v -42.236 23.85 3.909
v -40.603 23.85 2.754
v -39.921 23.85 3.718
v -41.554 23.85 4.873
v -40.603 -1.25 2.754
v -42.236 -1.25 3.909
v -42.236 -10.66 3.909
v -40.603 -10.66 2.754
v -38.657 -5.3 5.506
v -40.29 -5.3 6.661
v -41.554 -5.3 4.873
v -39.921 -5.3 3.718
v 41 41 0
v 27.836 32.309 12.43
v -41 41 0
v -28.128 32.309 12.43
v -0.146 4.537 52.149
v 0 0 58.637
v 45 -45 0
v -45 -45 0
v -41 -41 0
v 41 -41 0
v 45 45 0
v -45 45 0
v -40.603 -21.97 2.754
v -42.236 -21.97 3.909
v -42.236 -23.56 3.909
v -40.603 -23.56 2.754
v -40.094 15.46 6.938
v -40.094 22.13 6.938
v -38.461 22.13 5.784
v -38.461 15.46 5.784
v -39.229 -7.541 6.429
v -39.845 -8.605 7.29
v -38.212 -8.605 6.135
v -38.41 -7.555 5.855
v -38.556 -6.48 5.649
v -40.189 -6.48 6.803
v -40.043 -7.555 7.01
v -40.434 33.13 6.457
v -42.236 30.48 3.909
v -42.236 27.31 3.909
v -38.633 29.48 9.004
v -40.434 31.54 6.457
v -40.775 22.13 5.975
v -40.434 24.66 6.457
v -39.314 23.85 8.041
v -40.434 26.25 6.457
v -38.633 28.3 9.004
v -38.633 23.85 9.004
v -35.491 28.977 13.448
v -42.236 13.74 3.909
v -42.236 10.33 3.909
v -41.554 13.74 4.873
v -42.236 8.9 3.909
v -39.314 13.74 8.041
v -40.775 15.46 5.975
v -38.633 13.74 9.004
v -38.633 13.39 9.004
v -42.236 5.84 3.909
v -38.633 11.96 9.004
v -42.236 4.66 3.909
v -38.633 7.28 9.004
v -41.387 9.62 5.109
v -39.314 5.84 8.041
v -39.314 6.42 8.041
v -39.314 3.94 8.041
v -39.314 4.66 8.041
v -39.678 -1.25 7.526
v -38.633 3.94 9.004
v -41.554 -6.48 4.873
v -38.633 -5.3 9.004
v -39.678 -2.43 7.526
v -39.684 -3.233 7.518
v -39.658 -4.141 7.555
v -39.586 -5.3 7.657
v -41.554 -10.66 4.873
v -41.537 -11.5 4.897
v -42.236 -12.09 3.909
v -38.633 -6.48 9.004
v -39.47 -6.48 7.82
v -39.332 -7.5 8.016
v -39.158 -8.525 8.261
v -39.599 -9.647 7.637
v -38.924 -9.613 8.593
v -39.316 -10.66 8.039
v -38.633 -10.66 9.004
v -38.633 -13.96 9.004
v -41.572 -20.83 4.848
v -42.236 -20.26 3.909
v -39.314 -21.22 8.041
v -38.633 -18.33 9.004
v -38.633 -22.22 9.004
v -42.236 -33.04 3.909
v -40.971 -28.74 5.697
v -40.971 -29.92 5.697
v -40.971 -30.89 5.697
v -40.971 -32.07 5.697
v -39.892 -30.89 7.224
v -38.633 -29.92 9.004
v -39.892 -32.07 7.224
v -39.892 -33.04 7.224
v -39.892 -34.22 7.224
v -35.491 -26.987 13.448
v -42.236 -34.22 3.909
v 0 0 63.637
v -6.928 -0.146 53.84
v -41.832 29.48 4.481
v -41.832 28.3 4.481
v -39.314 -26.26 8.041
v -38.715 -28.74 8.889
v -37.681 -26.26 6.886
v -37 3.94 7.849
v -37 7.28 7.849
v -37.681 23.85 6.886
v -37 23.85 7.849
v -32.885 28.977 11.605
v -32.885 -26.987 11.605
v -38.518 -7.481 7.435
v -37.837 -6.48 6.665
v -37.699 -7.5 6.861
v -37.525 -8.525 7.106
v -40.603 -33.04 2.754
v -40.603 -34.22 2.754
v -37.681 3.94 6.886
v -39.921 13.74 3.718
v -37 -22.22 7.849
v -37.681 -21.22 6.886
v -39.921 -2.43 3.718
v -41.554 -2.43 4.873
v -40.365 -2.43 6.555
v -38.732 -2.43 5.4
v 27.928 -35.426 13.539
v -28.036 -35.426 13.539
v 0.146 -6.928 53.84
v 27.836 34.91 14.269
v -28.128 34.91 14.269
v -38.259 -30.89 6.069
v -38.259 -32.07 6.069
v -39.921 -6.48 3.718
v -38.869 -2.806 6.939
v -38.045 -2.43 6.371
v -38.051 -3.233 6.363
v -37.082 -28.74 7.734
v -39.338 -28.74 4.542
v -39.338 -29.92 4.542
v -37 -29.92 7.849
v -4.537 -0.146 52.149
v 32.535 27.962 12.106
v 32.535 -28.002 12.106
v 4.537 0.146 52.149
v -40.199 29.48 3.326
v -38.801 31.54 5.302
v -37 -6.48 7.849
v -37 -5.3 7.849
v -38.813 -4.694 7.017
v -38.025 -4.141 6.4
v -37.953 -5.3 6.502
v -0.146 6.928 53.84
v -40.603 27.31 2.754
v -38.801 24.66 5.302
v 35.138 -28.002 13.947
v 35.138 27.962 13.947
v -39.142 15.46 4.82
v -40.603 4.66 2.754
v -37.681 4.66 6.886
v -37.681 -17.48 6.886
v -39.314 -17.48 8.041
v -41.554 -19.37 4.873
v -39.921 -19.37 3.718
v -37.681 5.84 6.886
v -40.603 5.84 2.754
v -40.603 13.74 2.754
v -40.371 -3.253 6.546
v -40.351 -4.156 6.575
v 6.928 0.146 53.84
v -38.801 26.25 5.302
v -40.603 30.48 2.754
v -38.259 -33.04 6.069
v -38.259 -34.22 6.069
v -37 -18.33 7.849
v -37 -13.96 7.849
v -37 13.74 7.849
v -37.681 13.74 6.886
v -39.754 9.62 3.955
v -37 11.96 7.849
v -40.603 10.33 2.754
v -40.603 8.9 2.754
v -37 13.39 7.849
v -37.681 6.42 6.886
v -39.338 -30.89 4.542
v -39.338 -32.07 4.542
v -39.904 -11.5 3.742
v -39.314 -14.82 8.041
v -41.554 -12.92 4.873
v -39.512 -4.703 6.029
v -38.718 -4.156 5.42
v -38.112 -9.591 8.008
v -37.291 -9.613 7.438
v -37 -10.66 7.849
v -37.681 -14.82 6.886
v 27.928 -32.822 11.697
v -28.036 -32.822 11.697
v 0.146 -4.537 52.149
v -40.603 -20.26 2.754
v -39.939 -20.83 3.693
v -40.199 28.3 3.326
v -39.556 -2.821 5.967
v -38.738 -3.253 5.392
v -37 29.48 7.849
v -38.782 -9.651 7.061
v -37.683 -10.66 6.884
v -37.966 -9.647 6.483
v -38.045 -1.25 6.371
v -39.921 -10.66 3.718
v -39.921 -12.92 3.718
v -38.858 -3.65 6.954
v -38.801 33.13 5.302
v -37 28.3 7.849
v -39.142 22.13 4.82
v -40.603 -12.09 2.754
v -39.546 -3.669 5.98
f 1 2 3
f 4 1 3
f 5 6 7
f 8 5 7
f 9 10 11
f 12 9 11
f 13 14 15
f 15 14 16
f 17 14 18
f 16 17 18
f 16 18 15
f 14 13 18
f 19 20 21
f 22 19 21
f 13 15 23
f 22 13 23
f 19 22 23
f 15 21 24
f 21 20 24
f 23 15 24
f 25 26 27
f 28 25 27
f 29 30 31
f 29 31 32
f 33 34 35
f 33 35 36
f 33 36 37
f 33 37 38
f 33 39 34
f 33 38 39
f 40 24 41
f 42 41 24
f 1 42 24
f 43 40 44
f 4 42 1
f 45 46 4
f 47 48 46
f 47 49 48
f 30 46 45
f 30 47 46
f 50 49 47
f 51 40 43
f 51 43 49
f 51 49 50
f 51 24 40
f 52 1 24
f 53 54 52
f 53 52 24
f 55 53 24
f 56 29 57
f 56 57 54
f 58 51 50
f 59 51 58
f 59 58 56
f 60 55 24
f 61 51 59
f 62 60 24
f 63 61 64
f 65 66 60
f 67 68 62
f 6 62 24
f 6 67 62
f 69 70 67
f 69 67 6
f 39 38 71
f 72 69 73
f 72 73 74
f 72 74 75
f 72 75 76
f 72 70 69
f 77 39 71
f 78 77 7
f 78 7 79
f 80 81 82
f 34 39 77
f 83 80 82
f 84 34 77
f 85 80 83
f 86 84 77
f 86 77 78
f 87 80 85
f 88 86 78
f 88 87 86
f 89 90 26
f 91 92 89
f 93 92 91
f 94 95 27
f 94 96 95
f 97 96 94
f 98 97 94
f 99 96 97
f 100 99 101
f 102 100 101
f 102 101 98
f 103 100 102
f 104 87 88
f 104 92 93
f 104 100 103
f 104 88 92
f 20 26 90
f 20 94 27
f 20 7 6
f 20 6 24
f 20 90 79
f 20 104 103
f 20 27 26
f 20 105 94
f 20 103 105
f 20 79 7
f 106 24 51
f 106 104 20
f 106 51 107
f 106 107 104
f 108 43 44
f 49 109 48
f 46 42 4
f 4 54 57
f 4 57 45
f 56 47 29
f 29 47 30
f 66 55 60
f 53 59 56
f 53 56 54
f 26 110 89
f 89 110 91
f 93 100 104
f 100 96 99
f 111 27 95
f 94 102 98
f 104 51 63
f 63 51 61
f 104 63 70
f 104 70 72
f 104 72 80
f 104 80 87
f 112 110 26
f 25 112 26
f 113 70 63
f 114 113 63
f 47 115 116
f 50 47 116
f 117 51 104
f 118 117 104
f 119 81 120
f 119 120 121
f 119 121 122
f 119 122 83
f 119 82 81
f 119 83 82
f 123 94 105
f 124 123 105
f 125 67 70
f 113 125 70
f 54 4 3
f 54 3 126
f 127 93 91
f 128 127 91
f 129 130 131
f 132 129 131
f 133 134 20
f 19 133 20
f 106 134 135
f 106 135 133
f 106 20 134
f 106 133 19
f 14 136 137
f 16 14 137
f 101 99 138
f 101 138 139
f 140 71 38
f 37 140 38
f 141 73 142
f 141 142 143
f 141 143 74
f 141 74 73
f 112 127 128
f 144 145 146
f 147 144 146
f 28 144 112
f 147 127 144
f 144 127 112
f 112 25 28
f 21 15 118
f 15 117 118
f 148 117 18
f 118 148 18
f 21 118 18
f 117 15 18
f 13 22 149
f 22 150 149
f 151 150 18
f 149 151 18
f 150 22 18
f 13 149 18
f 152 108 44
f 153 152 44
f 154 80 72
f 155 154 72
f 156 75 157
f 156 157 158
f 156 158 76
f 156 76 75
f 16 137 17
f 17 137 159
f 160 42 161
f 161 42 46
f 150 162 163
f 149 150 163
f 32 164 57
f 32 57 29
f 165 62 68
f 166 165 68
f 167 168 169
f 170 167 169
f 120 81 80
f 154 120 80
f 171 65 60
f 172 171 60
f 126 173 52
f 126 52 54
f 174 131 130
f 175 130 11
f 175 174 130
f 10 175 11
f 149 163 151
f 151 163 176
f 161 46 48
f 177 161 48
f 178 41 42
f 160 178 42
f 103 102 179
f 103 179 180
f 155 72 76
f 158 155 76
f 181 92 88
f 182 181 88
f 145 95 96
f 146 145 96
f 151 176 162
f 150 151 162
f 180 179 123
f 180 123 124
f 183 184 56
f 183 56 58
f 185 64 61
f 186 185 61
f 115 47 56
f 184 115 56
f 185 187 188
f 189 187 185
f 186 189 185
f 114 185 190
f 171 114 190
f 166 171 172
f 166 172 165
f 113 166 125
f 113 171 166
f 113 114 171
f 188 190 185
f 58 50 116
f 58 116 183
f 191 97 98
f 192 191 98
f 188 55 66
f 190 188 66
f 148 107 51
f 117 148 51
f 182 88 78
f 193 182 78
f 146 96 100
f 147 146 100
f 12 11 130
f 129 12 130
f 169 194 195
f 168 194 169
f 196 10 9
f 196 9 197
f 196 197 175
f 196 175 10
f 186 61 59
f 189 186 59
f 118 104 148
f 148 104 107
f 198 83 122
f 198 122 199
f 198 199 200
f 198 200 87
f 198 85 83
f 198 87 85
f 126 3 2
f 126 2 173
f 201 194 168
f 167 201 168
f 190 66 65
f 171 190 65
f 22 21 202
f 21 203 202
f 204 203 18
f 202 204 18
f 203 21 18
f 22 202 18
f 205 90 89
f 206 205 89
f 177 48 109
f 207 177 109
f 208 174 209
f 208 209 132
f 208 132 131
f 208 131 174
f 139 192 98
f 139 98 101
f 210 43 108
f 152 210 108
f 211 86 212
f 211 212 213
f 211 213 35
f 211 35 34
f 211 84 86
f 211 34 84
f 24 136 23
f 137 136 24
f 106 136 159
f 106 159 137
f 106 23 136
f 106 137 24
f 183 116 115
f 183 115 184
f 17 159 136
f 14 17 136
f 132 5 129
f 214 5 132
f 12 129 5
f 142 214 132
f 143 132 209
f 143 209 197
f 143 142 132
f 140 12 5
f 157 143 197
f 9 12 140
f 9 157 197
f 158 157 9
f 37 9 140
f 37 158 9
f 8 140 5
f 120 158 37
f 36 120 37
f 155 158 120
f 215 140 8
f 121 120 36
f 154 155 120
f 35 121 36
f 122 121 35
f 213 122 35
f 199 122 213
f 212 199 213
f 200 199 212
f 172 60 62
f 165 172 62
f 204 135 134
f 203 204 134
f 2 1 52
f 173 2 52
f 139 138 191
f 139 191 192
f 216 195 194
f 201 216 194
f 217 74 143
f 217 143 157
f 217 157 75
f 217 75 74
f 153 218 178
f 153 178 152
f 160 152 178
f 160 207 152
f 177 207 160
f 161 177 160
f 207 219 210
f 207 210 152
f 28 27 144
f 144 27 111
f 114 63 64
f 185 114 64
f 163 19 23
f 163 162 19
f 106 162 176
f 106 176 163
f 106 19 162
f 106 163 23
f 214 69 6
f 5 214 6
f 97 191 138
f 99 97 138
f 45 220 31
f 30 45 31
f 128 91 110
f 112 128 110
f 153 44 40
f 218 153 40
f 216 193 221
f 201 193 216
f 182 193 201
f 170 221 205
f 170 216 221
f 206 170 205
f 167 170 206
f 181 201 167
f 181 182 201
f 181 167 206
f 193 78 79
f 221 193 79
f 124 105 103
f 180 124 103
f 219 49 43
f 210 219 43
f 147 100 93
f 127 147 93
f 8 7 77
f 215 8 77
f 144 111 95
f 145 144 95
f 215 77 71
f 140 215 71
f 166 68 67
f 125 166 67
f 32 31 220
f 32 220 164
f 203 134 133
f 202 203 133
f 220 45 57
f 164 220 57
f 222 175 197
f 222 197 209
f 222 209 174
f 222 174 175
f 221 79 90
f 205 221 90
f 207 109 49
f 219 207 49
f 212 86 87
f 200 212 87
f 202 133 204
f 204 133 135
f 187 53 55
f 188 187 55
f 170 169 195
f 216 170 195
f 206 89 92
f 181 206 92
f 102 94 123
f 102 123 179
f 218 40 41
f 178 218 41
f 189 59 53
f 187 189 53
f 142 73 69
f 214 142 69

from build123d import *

# Parameters (mm, degrees)
F2_W      = 90
F2_H      = 90
F6_W      = 82
F6_H      = 82
F12_DEPTH = 5
F13_DEPTH = 10.1
F14_DEPTH = 10
F15_DEPTH = 10
F16_W     = 1.180001
F16_H     = 1.870001
F16_W_2   = 1.18
F16_H_2   = 4.060001
F16_W_3   = 10.110001
F16_H_3   = 1.18
F16_W_4   = 6.670001
F17_DEPTH = 2


# Not quite as in the source:
# - the dataset's text gives a spline's control points without its knots; the knots are read off the source's solid


with BuildPart() as f3:
    # F2 (on Top) → F3 section 0
    with BuildSketch(Plane.XY, mode=Mode.PRIVATE) as f3_s0:
        Rectangle(F2_W, F2_H)
    loft([f3_s0.sketch, Vertex(0, 0, 63.6368)])

    # F6 (on face) → F7 section 0
    with BuildSketch(Plane.XY, mode=Mode.PRIVATE) as f7_s0:
        Rectangle(F6_W, F6_H)
    loft([f7_s0.sketch, Vertex(0, 0, 58.6368)], mode=Mode.SUBTRACT)

    # F8 (on face) → F12 (cut, symmetric)
    with BuildSketch(Plane(origin=(29.9991167733, 0, 21.2135156827), x_dir=(0, 1, 0), z_dir=(0.8164845616, 0, 0.5773672666))):
        Polygon((0.1463476627, 39.9593571873), (-28.0024763197, -8.9000007138), (27.9615262598, -8.9000007138), align=None)
    extrude(amount=F12_DEPTH, both=True, mode=Mode.SUBTRACT)

    # F9 (on face) → F13 (cut)
    with BuildSketch(Plane(origin=(0, 29.9991167733, 21.2135156827), x_dir=(-1, 0, 0), z_dir=(0, 0.8164845616, 0.5773672666))):
        Polygon((0.1463476627, 39.9593571873), (-27.835653627, -8.5054690465), (28.1283489525, -8.5054690465), align=None)
    extrude(amount=-F13_DEPTH, mode=Mode.SUBTRACT)

    # F10 (on face) → F14 (cut)
    with BuildSketch(Plane(origin=(-29.9991167733, 0, 21.2135156827), x_dir=(0, -1, 0), z_dir=(-0.8164845616, 0, 0.5773672666))):
        Polygon((0.1463476627, 39.9593571873), (-28.9770383388, -9.5114903525), (26.9869642407, -9.5114903525), align=None)
    extrude(amount=-F14_DEPTH, mode=Mode.SUBTRACT)

    # F11 (on face) → F15 (cut)
    with BuildSketch(Plane(origin=(0, -29.9991167733, 21.2135156827), x_dir=(1, 0, 0), z_dir=(0, -0.8164845616, 0.5773672666))):
        Polygon((0.1463476627, 39.9593571873), (-28.0361250043, -9.3999961391), (27.9278775752, -9.3999961391), align=None)
    extrude(amount=-F15_DEPTH, mode=Mode.SUBTRACT)

    # F16 (on face) → F17 (cut)
    with BuildSketch(Plane(origin=(-29.9991167733, 0, 21.2135156827), x_dir=(0, -1, 0), z_dir=(-0.8164845616, 0, 0.5773672666))):
        Polygon((21.9697801374, -21.1938021154), (23.5597841374, -21.1938021154), (28.7397811374, -15.0950853876), (28.7397811374, -19.0038021154), (29.9197811374, -19.0038021154), (29.9197811374, -14.9538011154), (28.8597821374, -14.9538011154), (28.7397811374, -14.9538011154), (22.2197811374, -14.9538011154), (21.2197821374, -16.1338011154), (26.2597841374, -16.1338011154), align=None)
        with Locations((31.4797826374, -18.0688016154)):
            Rectangle(F16_W, F16_H)
        with Locations((33.6297791374, -19.1638016154)):
            Rectangle(F16_W_2, F16_H_2)
        Polygon((12.0897811374, -21.1938021154), (20.2597801374, -21.1938021154), (20.8297821374, -20.0438011154), (18.3297821374, -14.9538011154), (13.9597791374, -14.9538011154), (11.4997811374, -19.9838021154), align=None)
        Polygon((19.3697831374, -20.0138021154), (12.9197831374, -20.0138021154), (14.8197791374, -16.1338011154), (17.4797821374, -16.1338011154), align=None, mode=Mode.SUBTRACT)
        with BuildLine():
            Line((5.2997801374, -14.9538011154), (5.2997801374, -16.6038011154))
            add(Edge.make_bspline(
                [(4.1407171374, -16.7288011154), (4.3252931374, -16.7141861154), (4.7128221374, -16.6835011154), (5.0980381374, -16.6311951154), (5.2997801374, -16.6038011154)],
                knots=[0, 0, 0, 0, 0.555346, 1.165986, 1.165986, 1.165986, 1.165986], degree=3))
            add(Edge.make_bspline(
                [(3.2325931374, -16.7738011154), (3.3718421374, -16.7690131154), (3.6747741374, -16.7585981154), (3.9772701374, -16.7392531154), (4.1407171374, -16.7288011154)],
                knots=[0, 0, 0, 0, 0.417971, 0.909282, 0.909282, 0.909282, 0.909282], degree=3))
            add(Edge.make_bspline(
                [(2.4297801374, -16.7638011154), (2.5552081374, -16.7691171154), (2.8227031374, -16.7804551154), (3.0904121374, -16.7761091154), (3.2325931374, -16.7738011154)],
                knots=[0, 0, 0, 0, 0.376537, 0.803027, 0.803027, 0.803027, 0.803027], degree=3))
            Line((2.4297801374, -16.7638011154), (1.2497801374, -16.7638011154))
            Line((1.2497801374, -16.7638011154), (1.2497801374, -21.1938021154))
            Line((1.2497801374, -21.1938021154), (10.6597801374, -21.1938021154))
            Line((10.6597801374, -21.1938021154), (10.6597801374, -20.0138021154))
            Line((10.6597801374, -20.0138021154), (6.4797801374, -20.0138021154))
            Line((6.4797801374, -20.0138021154), (6.4797801374, -17.6491141154))
            add(Edge.make_bspline(
                [(8.6047791374, -17.0530201154), (8.2523501374, -17.1763541154), (7.5565571374, -17.4198491154), (6.8355751374, -17.5733591154), (6.4797801374, -17.6491141154)],
                knots=[0, 0, 0, 0, 1.118887, 2.208999, 2.208999, 2.208999, 2.208999], degree=3))
            add(Edge.make_bspline(
                [(10.6597801374, -16.1361451154), (10.3259741374, -16.3048751154), (9.6557671374, -16.6436461154), (8.9560111374, -16.9162101154), (8.6047791374, -17.0530201154)],
                knots=[0, 0, 0, 0, 1.121359, 2.251432, 2.251432, 2.251432, 2.251432], degree=3))
            Line((10.6597801374, -16.1361451154), (10.6597801374, -14.9538011154))
            add(Edge.make_bspline(
                [(8.5247801374, -15.8638011154), (8.8834781374, -15.7390181154), (9.6157961374, -15.4842611154), (10.3070901374, -15.1330071154), (10.6597801374, -14.9538011154)],
                knots=[0, 0, 0, 0, 1.137935, 2.323212, 2.323212, 2.323212, 2.323212], degree=3))
            add(Edge.make_bspline(
                [(6.4797801374, -16.4038011154), (6.8146711374, -16.3298001154), (7.5036441374, -16.1775551154), (8.1781381374, -15.9703101154), (8.5247801374, -15.8638011154)],
                knots=[0, 0, 0, 0, 1.028459, 2.115858, 2.115858, 2.115858, 2.115858], degree=3))
            Line((6.4797801374, -16.4038011154), (6.4797801374, -14.9538011154))
            Line((6.4797801374, -14.9538011154), (5.2997801374, -14.9538011154))
        make_face()
        with BuildLine():
            Line((5.2997801374, -20.0138021154), (2.4297801374, -20.0138021154))
            Line((2.4297801374, -20.0138021154), (2.4297801374, -17.9538021154))
            add(Edge.make_bspline(
                [(3.2525921374, -17.9638011154), (3.1087451374, -17.9660571154), (2.8343741374, -17.9703591154), (2.5602071374, -17.9591391154), (2.4297801374, -17.9538021154)],
                knots=[0, 0, 0, 0, 0.431492, 0.823018, 0.823018, 0.823018, 0.823018], degree=3))
            add(Edge.make_bspline(
                [(4.1557951374, -17.9288011154), (3.9935791374, -17.9363501154), (3.6926011374, -17.9503551154), (3.3914391374, -17.9595581154), (3.2525921374, -17.9638011154)],
                knots=[0, 0, 0, 0, 0.487164, 0.903894, 0.903894, 0.903894, 0.903894], degree=3))
            add(Edge.make_bspline(
                [(5.2997801374, -17.8238011154), (5.1009381374, -17.8479581154), (4.7206281374, -17.8941601154), (4.3382501374, -17.9176111154), (4.1557951374, -17.9288011154)],
                knots=[0, 0, 0, 0, 0.600755, 1.14902, 1.14902, 1.14902, 1.14902], degree=3))
            Line((5.2997801374, -17.8238011154), (5.2997801374, -20.0138021154))
        make_face(mode=Mode.SUBTRACT)
        Polygon((-7.2802218626, -14.9538011154), (-9.6202208626, -19.7238021154), (-11.9602208626, -14.9538011154), (-13.3902208626, -14.9538011154), (-10.3302198626, -21.1938021154), (-8.9002208626, -21.1938021154), (-6.4202218626, -16.1338011154), (-5.8402208626, -16.1338011154), (-5.8402208626, -21.1938021154), (-4.6602208626, -21.1938021154), (-4.6602208626, -16.1338011154), (-3.9402198626, -16.1338011154), (-3.9402198626, -14.9538011154), align=None)
        with Locations((-18.7952213626, -15.5438011154)):
            Rectangle(F16_W_3, F16_H_3)
        with Locations((-18.7952213626, -18.0738011154)):
            Rectangle(F16_W_4, F16_H_3)
        with Locations((-18.7952213626, -20.6038021154)):
            Rectangle(F16_W_3, F16_H_3)
        Polygon((-33.1302218626, -18.0738021154), (-30.4802218626, -21.1938021154), (-27.3102218626, -21.1938021154), (-24.6602208626, -18.0738021154), (-26.2502218626, -18.0738021154), (-28.3002218626, -20.4938021154), (-28.3002218626, -14.9538011154), (-29.4802218626, -14.9538011154), (-29.4802218626, -20.4938021154), (-31.5402218626, -18.0738021154), align=None)
    extrude(amount=-F17_DEPTH, mode=Mode.SUBTRACT)


solid = f3.part
